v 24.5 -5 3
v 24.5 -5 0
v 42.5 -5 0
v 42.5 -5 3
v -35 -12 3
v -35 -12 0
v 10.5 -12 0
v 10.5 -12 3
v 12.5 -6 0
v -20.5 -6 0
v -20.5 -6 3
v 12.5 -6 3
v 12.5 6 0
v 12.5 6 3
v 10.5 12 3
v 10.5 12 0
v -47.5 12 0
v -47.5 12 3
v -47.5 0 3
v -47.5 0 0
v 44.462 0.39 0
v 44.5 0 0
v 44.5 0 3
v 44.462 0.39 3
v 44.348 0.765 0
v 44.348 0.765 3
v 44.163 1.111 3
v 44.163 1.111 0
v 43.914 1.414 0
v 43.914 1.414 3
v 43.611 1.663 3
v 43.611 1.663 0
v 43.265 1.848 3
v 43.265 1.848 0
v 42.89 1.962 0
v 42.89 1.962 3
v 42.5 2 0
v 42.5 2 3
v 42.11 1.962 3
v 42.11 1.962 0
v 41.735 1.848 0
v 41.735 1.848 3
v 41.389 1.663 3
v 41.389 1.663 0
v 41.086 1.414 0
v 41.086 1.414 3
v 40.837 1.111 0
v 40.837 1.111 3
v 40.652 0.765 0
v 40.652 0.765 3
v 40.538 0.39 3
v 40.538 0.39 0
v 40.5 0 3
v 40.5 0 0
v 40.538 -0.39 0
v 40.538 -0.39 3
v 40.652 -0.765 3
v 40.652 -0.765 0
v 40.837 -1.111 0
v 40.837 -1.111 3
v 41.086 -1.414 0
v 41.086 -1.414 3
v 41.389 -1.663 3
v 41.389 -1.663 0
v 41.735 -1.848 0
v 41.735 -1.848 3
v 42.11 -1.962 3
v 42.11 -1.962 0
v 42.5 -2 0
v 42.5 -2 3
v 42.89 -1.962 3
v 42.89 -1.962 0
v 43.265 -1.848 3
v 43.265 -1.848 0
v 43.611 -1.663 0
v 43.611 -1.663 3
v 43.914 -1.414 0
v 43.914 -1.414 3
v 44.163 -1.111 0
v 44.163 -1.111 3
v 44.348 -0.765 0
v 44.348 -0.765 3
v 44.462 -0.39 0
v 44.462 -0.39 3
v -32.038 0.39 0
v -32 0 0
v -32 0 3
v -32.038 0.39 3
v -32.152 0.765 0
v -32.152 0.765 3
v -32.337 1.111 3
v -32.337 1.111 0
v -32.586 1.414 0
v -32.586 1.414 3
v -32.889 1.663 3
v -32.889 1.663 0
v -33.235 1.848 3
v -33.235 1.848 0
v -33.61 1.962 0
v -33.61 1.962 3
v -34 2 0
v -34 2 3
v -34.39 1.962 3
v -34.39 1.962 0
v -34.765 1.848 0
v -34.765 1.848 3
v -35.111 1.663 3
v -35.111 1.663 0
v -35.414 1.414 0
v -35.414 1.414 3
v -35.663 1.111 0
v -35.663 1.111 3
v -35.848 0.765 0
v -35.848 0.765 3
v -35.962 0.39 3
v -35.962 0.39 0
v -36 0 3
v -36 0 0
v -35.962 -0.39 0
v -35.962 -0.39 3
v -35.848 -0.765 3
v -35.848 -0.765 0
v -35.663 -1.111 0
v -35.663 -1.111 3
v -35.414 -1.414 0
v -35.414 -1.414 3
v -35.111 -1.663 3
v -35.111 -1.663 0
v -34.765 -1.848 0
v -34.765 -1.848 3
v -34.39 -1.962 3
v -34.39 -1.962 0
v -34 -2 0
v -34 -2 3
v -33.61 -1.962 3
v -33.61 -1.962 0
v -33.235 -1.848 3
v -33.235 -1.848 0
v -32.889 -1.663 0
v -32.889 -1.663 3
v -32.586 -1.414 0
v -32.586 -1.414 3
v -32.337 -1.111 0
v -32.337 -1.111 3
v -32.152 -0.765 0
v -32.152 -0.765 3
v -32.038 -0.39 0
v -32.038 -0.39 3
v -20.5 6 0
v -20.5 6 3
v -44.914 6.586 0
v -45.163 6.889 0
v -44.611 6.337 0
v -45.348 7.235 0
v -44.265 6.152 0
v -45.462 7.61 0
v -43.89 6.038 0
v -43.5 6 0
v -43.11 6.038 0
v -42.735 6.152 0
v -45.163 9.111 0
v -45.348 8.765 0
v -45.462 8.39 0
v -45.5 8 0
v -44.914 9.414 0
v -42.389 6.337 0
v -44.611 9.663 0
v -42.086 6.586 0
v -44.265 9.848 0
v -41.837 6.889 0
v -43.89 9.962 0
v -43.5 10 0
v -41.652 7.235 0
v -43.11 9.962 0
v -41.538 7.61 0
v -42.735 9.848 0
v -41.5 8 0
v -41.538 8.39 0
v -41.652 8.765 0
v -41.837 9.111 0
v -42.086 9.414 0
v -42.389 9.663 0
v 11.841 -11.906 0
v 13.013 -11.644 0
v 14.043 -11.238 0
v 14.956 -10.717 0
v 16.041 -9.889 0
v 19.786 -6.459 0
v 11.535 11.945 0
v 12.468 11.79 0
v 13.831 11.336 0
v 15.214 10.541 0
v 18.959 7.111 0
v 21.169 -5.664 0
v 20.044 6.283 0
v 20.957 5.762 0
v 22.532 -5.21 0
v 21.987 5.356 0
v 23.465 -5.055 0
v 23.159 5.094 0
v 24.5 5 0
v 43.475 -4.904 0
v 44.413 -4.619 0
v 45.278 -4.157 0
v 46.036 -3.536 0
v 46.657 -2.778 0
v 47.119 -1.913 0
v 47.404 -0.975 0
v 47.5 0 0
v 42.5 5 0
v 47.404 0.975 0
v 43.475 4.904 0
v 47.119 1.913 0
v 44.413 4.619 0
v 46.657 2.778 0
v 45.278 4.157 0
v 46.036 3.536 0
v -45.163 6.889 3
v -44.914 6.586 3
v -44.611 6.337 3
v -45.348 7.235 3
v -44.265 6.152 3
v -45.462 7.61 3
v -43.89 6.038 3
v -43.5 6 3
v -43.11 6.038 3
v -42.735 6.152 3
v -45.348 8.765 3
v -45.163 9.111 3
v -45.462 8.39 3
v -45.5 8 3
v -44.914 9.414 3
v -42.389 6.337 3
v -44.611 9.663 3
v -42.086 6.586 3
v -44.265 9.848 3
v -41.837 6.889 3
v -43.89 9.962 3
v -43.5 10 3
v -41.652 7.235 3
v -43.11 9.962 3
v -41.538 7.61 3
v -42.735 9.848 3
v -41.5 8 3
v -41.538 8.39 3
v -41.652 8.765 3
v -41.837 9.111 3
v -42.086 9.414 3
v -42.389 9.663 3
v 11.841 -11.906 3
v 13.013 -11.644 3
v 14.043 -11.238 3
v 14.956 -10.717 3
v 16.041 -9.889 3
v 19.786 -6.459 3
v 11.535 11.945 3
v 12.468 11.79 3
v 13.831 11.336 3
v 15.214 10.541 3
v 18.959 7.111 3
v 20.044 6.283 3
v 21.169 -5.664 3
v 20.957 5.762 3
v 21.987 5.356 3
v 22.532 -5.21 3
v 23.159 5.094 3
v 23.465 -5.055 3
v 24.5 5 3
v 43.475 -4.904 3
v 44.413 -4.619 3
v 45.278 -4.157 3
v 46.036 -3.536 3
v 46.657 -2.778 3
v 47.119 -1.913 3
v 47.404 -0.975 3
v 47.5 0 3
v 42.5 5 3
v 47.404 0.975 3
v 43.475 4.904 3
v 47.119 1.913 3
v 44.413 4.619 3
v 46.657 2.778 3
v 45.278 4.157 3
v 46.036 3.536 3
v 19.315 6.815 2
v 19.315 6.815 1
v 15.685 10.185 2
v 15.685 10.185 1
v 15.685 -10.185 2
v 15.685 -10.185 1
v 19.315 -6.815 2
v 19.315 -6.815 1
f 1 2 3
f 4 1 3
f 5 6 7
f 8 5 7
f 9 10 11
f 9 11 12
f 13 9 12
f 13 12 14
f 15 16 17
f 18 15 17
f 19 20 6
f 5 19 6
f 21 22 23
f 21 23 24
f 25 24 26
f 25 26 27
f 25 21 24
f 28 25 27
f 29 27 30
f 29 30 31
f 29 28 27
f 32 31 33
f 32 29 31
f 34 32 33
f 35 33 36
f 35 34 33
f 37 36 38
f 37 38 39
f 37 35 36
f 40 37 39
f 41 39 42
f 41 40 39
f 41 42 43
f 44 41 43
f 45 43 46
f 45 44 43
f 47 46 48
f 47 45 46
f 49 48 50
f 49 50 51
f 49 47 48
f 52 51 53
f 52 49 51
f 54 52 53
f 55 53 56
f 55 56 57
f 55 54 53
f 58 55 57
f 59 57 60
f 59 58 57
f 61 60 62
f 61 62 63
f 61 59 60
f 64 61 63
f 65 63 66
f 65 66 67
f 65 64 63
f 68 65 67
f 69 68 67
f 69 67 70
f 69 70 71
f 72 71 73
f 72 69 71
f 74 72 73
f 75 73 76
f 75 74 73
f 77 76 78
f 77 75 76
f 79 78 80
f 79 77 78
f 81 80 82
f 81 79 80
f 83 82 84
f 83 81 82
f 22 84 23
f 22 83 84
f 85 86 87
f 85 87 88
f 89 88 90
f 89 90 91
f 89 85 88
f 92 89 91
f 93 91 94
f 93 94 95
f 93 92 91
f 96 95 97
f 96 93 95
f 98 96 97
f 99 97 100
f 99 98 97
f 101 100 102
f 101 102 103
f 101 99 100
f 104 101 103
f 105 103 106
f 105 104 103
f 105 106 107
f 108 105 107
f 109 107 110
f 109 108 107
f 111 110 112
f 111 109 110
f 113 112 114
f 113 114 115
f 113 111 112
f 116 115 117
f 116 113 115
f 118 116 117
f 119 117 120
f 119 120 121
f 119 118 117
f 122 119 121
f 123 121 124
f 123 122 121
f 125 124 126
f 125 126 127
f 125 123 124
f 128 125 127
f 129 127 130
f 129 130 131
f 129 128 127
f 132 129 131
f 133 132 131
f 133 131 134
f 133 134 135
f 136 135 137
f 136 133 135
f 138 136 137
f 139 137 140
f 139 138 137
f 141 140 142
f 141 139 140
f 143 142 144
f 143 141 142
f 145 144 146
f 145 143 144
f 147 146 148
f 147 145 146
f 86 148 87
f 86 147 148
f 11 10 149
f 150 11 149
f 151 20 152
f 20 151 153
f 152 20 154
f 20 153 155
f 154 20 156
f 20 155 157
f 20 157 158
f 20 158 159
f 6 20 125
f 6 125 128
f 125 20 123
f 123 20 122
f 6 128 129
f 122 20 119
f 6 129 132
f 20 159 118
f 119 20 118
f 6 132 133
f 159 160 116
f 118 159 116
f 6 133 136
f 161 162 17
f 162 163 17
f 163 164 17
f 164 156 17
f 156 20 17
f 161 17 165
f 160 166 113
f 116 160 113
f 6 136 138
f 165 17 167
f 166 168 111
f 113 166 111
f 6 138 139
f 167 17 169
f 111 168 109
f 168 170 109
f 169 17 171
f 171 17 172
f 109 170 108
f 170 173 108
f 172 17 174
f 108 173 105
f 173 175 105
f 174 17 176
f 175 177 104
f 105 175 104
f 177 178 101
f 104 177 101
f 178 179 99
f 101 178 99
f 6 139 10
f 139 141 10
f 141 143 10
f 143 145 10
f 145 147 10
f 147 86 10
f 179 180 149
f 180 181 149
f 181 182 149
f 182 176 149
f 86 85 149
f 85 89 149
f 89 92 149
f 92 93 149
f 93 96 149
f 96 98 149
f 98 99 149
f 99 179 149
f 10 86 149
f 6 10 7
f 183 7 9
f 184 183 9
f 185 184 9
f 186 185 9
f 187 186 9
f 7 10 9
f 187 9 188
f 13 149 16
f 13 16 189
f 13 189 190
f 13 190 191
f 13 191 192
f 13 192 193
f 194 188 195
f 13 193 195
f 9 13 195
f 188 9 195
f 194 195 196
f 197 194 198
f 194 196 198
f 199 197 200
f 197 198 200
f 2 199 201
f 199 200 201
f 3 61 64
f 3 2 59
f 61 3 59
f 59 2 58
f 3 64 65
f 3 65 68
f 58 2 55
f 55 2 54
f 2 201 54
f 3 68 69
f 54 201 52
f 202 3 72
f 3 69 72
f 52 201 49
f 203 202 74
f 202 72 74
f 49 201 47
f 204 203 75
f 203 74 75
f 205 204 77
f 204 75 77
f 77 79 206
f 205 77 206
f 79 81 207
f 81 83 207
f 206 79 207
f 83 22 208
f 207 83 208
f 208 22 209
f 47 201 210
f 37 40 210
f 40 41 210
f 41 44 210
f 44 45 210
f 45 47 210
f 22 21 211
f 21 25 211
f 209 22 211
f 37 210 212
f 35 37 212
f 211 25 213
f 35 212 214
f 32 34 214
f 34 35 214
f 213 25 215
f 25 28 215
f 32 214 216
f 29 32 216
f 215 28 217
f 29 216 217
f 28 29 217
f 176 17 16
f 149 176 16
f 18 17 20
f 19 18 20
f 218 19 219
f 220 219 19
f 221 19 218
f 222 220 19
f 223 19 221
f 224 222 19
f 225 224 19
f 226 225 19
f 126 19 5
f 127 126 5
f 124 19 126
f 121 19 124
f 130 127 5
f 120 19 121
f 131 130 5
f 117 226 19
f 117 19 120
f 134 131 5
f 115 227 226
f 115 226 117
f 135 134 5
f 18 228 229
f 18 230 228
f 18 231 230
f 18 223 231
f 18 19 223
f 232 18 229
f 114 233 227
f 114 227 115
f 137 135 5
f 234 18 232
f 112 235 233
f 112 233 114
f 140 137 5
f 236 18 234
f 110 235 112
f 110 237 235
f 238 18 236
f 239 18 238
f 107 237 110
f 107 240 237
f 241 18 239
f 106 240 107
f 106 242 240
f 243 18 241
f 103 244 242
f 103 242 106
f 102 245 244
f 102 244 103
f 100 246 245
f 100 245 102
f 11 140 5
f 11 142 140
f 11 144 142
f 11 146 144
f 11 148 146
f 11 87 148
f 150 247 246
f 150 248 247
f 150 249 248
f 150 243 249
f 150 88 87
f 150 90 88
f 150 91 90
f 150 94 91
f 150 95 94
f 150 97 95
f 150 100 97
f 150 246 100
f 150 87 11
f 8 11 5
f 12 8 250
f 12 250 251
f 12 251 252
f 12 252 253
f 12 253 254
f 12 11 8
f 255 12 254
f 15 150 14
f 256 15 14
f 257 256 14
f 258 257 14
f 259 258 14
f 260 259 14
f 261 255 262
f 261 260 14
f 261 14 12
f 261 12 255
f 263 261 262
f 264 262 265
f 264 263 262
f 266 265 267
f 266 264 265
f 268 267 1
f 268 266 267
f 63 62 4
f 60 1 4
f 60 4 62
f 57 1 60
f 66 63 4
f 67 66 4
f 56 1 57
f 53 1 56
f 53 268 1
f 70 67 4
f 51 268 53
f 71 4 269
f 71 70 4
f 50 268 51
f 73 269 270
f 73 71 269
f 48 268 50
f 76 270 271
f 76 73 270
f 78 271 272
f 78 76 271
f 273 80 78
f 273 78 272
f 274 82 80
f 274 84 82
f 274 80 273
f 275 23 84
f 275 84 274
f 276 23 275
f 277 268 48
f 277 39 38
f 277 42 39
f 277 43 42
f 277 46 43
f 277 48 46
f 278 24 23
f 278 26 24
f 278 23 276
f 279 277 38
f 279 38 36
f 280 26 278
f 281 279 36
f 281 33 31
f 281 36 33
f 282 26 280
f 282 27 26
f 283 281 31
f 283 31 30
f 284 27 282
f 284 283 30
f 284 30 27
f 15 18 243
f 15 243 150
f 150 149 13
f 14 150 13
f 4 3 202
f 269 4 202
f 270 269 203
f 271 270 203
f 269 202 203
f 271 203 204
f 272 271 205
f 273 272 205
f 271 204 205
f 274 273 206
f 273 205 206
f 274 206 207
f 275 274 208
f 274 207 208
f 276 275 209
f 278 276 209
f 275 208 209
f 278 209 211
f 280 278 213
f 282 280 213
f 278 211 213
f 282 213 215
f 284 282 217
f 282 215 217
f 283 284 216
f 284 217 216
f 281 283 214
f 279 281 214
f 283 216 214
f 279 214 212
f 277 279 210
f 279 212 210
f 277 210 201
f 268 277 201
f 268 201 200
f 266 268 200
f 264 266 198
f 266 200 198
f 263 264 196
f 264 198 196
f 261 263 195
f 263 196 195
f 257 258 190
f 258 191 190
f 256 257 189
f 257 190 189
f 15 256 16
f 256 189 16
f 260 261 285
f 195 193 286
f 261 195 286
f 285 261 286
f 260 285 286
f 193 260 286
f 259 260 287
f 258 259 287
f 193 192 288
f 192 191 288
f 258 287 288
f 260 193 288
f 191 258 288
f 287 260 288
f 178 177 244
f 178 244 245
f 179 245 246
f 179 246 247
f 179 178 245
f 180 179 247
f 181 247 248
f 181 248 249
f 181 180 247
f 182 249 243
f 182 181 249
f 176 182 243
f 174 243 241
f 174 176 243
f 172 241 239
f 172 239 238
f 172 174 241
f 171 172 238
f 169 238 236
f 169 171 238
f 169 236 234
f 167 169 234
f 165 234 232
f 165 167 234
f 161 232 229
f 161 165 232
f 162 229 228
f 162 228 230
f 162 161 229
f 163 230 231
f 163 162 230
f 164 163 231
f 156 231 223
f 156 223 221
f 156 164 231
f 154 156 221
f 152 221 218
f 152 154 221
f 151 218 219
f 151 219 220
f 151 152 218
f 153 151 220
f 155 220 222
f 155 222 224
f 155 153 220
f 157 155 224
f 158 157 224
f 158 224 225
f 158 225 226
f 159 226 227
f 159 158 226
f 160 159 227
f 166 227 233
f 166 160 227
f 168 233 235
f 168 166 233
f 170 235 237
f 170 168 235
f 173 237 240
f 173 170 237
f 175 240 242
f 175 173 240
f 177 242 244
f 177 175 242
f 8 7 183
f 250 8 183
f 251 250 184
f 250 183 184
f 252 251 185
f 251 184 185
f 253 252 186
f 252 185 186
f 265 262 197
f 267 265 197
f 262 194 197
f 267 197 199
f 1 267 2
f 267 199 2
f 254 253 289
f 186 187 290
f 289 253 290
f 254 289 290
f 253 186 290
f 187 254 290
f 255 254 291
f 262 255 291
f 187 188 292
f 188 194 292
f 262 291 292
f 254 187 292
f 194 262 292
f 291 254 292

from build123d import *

# Parameters (mm, degrees)
ESQUISSE1_R        = 2
ESQUISSE1_W        = 33
ESQUISSE1_H        = 12
BOSS_EXTRU_1_DEPTH = 3


with BuildPart() as part:
    # Esquisse1 → Boss.-Extru.1 (new body)
    with BuildSketch(Plane.XY):
        with BuildLine():
            Line((-47.5, 12), (-47.5, 0))
            Line((-47.5, 0), (-35, -12))
            Line((-35, -12), (10.5, -12))
            add(Edge.make_bspline(
                [(10.5, -12), (17.5, -12), (17.5, -5), (24.5, -5)],
                knots=[0.5, 0.5, 0.5, 0.5, 1.5, 1.5, 1.5, 1.5], degree=3))
            Line((24.5, -5), (42.5, -5))
            ThreePointArc((42.5, -5), (47.5, 0), (42.5, 5))
            Line((42.5, 5), (24.5, 5))
            add(Edge.make_bspline(
                [(24.5, 5), (17.5, 5), (17.5, 12), (10.5, 12)],
                knots=[0, 0, 0, 0, 1, 1, 1, 1], degree=3))
            Line((10.5, 12), (-47.5, 12))
        make_face()
        with Locations((-34, 0)):
            Circle(ESQUISSE1_R, mode=Mode.SUBTRACT)
        with Locations((-4, 0)):
            Rectangle(ESQUISSE1_W, ESQUISSE1_H, mode=Mode.SUBTRACT)
        with Locations((-43.5, 8)):
            Circle(ESQUISSE1_R, mode=Mode.SUBTRACT)
        with Locations((42.5, 0)):
            Circle(ESQUISSE1_R, mode=Mode.SUBTRACT)
    extrude(amount=BOSS_EXTRU_1_DEPTH)


solid = part.part
